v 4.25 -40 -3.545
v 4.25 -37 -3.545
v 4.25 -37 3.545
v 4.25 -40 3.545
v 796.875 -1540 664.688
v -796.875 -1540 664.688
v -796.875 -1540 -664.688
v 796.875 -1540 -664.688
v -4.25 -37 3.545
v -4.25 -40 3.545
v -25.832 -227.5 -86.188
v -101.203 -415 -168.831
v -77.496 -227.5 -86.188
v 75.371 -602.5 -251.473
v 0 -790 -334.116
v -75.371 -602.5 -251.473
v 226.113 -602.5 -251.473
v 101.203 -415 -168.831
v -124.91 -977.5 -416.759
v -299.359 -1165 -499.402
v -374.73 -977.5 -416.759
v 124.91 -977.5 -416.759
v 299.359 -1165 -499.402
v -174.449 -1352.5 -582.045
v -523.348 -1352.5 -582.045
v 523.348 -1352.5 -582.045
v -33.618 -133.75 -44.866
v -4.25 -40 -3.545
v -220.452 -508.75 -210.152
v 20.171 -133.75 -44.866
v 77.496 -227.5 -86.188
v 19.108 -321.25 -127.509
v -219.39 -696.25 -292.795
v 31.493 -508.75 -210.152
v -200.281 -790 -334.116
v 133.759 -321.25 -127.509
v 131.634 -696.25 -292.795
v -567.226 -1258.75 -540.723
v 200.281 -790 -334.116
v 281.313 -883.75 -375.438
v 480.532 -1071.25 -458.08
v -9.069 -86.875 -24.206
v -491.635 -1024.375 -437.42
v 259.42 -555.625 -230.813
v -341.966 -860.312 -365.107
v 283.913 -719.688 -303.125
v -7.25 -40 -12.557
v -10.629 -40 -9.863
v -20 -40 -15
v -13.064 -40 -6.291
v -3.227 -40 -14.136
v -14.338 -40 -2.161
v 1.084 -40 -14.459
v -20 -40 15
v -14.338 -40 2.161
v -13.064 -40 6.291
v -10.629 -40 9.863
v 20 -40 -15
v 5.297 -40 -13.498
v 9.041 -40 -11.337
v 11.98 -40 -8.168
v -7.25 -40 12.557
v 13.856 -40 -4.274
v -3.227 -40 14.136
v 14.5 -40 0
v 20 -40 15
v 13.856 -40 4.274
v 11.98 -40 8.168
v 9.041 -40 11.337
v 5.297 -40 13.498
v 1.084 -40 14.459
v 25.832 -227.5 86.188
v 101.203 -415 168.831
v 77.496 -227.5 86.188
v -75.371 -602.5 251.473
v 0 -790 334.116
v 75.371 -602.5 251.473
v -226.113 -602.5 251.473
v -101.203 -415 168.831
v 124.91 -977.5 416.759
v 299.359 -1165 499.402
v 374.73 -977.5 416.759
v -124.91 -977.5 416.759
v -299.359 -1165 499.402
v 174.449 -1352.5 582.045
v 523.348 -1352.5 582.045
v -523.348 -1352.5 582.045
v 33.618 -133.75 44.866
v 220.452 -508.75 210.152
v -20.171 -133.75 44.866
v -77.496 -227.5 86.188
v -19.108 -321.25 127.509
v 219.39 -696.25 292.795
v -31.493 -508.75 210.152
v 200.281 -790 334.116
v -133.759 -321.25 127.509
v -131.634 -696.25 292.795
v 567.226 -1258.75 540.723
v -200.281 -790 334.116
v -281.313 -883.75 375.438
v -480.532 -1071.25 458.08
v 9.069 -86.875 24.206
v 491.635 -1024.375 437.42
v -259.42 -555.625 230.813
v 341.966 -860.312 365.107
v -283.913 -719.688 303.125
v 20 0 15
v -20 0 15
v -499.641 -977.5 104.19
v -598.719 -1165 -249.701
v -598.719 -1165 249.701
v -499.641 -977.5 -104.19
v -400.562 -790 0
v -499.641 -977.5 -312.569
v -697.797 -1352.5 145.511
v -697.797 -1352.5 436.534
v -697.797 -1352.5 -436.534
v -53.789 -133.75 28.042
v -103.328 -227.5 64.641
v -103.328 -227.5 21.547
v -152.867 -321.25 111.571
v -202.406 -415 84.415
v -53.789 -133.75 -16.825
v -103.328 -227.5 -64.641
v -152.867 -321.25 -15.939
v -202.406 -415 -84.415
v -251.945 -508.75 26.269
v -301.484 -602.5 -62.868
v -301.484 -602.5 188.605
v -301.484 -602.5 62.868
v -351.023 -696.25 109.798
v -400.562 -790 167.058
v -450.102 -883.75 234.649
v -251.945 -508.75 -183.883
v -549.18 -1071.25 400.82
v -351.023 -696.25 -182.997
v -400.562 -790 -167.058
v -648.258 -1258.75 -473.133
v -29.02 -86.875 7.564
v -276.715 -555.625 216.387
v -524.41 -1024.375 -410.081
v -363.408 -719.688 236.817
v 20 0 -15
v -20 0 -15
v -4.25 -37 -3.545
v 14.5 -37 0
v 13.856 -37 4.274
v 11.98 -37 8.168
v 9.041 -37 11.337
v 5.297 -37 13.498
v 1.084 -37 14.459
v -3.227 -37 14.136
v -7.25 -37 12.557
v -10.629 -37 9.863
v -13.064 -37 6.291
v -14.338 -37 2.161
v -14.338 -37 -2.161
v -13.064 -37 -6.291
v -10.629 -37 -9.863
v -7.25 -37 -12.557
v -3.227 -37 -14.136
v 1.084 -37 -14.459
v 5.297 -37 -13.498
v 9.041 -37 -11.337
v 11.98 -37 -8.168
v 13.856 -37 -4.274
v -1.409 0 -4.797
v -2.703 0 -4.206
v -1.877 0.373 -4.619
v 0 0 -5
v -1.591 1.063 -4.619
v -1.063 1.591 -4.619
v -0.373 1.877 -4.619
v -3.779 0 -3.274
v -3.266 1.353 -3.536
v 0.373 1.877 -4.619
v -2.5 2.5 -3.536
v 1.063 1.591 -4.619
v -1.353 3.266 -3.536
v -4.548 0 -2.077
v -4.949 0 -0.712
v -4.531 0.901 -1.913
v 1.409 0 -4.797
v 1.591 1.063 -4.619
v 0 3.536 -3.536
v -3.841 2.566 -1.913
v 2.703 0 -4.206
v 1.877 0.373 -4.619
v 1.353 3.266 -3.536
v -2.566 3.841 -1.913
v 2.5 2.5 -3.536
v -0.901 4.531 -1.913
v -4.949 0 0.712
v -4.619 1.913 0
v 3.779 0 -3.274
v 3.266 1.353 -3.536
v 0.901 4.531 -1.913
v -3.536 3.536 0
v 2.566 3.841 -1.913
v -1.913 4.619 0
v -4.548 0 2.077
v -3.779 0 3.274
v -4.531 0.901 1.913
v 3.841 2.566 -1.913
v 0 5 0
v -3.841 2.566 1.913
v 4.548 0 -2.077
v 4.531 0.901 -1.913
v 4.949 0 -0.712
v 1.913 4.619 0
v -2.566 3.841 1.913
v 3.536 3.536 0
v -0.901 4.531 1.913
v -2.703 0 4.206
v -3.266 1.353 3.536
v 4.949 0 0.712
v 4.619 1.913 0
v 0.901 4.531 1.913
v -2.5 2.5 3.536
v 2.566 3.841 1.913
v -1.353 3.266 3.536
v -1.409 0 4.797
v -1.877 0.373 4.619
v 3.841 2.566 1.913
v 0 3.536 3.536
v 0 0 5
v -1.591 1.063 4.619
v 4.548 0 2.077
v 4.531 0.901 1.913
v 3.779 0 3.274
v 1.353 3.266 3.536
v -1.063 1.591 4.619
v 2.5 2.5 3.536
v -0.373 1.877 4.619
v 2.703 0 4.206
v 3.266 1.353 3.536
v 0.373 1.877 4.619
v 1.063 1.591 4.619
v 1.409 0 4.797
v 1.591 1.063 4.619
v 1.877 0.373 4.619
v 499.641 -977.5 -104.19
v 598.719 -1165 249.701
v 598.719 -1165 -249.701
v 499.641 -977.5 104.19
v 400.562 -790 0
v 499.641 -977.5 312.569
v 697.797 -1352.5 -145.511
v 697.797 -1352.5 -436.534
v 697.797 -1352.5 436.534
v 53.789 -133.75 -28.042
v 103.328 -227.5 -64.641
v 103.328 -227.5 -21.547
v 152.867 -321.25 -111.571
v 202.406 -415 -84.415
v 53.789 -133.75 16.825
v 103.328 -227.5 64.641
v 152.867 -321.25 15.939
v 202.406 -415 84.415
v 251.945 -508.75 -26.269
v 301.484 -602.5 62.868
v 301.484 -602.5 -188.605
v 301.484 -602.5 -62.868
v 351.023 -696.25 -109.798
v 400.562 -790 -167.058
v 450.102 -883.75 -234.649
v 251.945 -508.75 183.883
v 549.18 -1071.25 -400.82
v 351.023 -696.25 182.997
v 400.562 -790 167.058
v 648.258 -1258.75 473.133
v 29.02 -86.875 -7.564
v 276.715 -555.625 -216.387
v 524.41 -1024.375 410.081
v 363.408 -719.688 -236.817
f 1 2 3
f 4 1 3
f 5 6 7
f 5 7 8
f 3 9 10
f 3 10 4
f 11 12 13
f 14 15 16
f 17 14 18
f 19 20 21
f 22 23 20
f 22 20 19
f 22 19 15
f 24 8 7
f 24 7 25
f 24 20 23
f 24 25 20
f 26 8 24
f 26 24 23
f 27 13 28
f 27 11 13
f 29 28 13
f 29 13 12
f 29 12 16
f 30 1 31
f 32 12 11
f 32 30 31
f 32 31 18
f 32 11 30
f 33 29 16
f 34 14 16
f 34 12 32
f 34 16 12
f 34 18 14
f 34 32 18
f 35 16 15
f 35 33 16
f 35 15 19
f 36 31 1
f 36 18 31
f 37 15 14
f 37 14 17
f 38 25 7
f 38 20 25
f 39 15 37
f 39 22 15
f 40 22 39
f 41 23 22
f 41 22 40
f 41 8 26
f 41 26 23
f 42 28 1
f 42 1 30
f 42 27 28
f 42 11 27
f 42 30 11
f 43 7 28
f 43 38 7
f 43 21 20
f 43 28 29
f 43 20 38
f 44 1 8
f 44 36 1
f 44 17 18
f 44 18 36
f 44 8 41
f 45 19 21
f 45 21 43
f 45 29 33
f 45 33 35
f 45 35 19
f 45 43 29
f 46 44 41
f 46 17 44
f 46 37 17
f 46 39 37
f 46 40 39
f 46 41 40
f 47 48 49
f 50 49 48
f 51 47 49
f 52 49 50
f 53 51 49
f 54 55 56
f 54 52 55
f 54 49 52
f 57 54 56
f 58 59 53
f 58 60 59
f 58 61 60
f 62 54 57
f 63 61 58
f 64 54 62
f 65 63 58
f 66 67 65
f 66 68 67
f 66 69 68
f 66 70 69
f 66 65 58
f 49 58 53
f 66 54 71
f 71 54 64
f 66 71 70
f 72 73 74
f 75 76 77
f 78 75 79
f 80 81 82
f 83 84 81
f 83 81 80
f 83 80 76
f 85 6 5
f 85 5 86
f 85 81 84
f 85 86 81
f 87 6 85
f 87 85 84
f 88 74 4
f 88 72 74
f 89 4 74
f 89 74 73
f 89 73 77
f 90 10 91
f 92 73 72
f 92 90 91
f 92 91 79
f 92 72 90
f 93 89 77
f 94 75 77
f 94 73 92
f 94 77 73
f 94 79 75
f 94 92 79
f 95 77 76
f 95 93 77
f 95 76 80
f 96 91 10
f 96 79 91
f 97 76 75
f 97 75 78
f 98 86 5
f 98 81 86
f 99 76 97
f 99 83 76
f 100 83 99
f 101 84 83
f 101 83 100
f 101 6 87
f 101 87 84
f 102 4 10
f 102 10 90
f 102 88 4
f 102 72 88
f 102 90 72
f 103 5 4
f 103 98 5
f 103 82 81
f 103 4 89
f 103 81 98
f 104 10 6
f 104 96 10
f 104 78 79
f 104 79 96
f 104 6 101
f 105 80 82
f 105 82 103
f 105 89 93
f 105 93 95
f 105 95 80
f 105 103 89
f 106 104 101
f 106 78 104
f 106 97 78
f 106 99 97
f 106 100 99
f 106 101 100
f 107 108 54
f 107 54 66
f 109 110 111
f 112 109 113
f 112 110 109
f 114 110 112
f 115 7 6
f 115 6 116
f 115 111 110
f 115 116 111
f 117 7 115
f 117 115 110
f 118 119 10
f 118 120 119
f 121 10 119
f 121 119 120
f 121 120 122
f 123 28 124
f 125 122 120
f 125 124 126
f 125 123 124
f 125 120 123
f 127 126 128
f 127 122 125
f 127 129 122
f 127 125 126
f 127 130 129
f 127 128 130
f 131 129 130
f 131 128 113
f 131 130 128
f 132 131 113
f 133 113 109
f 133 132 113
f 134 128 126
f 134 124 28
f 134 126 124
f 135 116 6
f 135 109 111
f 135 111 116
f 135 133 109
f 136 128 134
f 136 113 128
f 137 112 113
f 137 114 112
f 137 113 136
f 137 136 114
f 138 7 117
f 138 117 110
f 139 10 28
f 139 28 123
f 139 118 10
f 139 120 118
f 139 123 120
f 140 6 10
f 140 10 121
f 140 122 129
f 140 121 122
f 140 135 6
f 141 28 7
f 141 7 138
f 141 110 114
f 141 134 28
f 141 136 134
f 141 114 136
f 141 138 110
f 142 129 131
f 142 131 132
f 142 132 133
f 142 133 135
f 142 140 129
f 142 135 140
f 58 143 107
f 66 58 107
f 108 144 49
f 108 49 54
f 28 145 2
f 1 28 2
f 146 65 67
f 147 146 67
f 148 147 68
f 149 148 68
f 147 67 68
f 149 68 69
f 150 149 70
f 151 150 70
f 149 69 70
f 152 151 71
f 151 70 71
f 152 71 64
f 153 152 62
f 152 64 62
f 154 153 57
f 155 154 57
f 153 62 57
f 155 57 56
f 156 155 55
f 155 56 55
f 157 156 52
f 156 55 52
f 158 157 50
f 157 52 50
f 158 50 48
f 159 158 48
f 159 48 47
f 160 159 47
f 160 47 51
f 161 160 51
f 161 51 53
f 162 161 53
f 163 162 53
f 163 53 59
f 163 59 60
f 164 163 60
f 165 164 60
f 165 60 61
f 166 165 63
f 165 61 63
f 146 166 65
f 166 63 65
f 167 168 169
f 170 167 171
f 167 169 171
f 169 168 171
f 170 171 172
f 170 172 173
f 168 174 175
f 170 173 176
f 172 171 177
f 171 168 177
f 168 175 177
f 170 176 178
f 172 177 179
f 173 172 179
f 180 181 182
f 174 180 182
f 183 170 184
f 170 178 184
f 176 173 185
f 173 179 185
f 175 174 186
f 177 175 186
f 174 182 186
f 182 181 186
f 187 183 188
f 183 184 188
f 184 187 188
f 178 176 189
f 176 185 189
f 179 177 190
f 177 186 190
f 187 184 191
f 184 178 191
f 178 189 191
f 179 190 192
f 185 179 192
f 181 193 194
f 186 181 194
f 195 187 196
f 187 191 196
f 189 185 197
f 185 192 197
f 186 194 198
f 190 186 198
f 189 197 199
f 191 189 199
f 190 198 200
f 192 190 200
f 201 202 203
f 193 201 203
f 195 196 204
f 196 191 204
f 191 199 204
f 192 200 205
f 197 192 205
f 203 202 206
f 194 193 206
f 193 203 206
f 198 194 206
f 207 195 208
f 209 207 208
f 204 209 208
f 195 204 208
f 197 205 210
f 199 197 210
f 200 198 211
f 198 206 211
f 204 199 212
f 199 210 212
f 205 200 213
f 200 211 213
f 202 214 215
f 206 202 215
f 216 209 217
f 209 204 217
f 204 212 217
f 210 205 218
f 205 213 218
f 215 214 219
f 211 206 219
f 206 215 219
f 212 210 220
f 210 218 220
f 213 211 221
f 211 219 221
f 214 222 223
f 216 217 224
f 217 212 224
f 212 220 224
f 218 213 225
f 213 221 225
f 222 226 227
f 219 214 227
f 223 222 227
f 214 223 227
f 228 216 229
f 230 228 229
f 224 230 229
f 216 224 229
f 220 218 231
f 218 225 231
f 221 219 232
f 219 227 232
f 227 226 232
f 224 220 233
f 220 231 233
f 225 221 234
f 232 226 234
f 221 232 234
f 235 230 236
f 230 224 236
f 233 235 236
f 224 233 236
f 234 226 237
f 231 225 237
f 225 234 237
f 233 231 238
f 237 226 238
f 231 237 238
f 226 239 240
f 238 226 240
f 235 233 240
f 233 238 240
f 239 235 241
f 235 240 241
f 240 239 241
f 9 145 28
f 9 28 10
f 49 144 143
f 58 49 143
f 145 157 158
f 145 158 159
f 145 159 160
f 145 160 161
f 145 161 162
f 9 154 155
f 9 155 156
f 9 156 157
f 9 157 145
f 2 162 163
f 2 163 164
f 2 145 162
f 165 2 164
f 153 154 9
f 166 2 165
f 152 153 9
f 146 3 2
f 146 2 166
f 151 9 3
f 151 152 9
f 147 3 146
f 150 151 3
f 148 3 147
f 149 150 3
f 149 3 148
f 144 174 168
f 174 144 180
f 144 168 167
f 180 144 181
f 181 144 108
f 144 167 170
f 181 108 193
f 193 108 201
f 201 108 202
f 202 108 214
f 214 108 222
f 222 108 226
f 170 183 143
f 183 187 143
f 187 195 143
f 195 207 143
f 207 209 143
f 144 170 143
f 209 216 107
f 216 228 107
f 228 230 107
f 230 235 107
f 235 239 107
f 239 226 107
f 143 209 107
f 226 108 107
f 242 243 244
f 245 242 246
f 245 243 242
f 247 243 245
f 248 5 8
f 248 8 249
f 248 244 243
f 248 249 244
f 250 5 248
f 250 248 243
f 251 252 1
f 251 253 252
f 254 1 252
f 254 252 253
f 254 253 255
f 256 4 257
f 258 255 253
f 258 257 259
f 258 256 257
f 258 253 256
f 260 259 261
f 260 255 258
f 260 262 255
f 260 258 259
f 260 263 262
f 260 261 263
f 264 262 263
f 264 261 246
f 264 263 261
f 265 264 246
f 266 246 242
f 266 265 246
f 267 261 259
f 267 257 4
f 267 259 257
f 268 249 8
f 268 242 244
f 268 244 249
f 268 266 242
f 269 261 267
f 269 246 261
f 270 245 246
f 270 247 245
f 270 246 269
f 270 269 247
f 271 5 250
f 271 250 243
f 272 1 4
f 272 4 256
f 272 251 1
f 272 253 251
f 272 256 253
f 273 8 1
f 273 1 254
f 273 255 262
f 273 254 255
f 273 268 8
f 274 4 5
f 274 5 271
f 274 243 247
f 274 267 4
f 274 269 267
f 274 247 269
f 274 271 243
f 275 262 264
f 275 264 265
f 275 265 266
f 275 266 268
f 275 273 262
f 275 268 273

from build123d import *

# Parameters (mm, degrees)
F0_W      = 40
F0_H      = 30
F1_DEPTH  = 40
F3_R      = 14.5
F4_DEPTH  = 3
F5_W      = 8.5
F5_H      = 7.09
F6_DEPTH  = 3
F6_FACE_W = 8.5
F6_FACE_H = 7.09
F8_W      = 1593.75
F8_H      = 1329.375


with BuildPart() as f1:
    # F0 (on Front) → F1 (new body)
    with BuildSketch(Plane.XZ):
        Rectangle(F0_W, F0_H)
    extrude(amount=F1_DEPTH)

    # F3 (on face) → F4 (cut)
    with BuildSketch(Plane.XZ.offset(40)):
        Circle(F3_R)
    extrude(amount=-F4_DEPTH, mode=Mode.SUBTRACT)

    # F5 (on face) → F6 (join)
    with BuildSketch(Plane.XZ.offset(37)):
        Rectangle(F5_W, F5_H)
    extrude(amount=F6_DEPTH)

    # F6_face (on face) → F9 section 0
    with BuildSketch(Plane.XZ.offset(40)):
        Rectangle(F6_FACE_W, F6_FACE_H)
    # F8 (on offset) → F9 section 1
    with BuildSketch(Plane.XZ.offset(1540)):
        Rectangle(F8_W, F8_H)
    loft()

    # F10 (on face) → F11 (revolve)
    with BuildSketch(Plane.XZ):
        with BuildLine():
            ThreePointArc((0, -5), (5, 0), (0, 5))
            Line((0, 5), (0, -5))
        make_face()
    revolve(axis=Axis((0, 0, 0), (0, 0, -1)))


solid = f1.part
